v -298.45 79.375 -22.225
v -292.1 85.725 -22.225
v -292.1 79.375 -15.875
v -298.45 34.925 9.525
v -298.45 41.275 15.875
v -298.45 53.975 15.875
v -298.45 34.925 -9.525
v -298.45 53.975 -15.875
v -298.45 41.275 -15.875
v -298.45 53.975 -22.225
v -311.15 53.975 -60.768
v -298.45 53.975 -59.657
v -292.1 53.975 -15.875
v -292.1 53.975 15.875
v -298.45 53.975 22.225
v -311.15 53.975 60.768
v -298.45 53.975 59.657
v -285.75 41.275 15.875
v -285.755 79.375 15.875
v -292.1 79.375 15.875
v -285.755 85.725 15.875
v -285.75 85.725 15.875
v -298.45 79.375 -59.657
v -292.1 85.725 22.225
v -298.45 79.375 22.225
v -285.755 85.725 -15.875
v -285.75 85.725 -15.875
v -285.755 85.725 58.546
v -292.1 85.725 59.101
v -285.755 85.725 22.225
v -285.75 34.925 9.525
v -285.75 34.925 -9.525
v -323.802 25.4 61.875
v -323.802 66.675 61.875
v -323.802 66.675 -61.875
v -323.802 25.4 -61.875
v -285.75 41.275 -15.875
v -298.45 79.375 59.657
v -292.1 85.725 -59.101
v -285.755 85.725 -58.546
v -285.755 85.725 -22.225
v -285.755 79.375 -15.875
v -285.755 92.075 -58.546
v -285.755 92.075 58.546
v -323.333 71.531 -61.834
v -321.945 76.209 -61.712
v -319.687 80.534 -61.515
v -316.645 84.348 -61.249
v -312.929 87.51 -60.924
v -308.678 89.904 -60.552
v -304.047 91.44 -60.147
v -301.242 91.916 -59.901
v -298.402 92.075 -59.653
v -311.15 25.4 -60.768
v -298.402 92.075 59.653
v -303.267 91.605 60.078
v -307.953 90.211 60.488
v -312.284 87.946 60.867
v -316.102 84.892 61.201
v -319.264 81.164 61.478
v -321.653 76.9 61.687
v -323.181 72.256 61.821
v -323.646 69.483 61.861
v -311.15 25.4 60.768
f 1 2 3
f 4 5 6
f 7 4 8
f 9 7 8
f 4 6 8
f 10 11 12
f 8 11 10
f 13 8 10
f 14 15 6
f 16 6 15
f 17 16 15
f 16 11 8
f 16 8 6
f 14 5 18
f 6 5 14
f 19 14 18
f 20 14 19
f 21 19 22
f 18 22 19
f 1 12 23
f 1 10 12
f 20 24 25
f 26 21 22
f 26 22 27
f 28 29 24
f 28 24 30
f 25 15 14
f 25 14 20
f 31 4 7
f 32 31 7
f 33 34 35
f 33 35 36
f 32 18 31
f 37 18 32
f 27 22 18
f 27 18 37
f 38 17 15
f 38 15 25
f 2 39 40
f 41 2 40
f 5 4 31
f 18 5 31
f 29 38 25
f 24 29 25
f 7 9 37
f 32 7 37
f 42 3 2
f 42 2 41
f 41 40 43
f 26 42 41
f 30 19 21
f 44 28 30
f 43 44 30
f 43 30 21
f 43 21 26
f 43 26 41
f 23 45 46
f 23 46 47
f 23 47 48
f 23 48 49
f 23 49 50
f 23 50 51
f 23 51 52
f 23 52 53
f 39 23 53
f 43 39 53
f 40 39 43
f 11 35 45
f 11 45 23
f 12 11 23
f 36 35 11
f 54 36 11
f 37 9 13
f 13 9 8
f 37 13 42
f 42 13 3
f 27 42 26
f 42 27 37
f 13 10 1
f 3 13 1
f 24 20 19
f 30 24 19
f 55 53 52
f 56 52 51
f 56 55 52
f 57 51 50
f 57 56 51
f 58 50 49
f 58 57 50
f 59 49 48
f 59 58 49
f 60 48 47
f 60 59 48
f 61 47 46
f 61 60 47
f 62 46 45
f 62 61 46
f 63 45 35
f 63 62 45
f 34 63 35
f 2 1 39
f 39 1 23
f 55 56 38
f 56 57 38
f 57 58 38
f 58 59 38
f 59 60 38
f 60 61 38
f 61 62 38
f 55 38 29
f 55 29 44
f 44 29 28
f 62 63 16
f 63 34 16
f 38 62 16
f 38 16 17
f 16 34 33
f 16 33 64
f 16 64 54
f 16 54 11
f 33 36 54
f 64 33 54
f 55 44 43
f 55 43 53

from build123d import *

# Parameters (mm, degrees)
BOSS_EXTRUDE1_START       = -61.874871948
BOSS_EXTRUDE1_DEPTH       = 61.874871948
BOSS_EXTRUDE1_START_2     = 33.418244096
BOSS_EXTRUDE1_2_OUTLINE_W = 41
BOSS_EXTRUDE1_2_OUTLINE_H = 70
BOSS_EXTRUDE1_2_DEPTH     = 4.581755904
SKETCH2_W                 = 31.75
SKETCH2_H                 = 50.8
BOSS_EXTRUDE2_DEPTH       = 12.7
CHAMFER1_SIZE             = 6.35


with BuildPart() as part:
    # Boss-Extrude1: read off the stored shape, not the designer's step
    # Boss-Extrude1 outline → Boss-Extrude1 (new body)
    with BuildSketch(Plane.XY.offset(BOSS_EXTRUDE1_START)):
        with BuildLine():
            Line((-285.755139406, 85.725), (-285.755139406, 92.075))
            Line((-285.755139406, 92.075), (-298.401672666, 92.075))
            ThreePointArc((-298.401672666, 92.075), (-316.362184908, 84.635512242), (-323.801672666, 66.675))
            Line((-323.801672666, 66.675), (-323.801672666, 25.4))
            Line((-323.801672666, 25.4), (-311.15, 25.4))
            Line((-311.15, 25.4), (-311.15, 53.975))
            Line((-311.15, 53.975), (-298.45, 53.975))
            Line((-298.45, 53.975), (-298.45, 85.725))
            Line((-298.45, 85.725), (-285.755139406, 85.725))
        make_face()
    boss_extrude1 = extrude(amount=BOSS_EXTRUDE1_DEPTH)

    # Boss-Extrude1 2 outline → Boss-Extrude1 2 (cut)
    with BuildSketch(Plane(origin=(0, 0, 0), x_dir=(0.9961946980917459, 0, 0.08715574274765299), z_dir=(0.087155742747653, 0, -0.996194698091746)).offset(BOSS_EXTRUDE1_START_2)):
        with Locations((-308.5, -59)):
            Rectangle(BOSS_EXTRUDE1_2_OUTLINE_W, BOSS_EXTRUDE1_2_OUTLINE_H)
    boss_extrude1_2 = extrude(amount=BOSS_EXTRUDE1_2_DEPTH, mode=Mode.SUBTRACT)

    # Mirror1: Boss-Extrude1, Boss-Extrude1 2 across plane
    add(boss_extrude1.mirror(Plane.XY))
    add(boss_extrude1_2.mirror(Plane.XY), mode=Mode.SUBTRACT)

    # Sketch2 → Boss-Extrude2 (add)
    with BuildSketch(Plane(origin=(-298.45, 0, 0), x_dir=(0, 0, -1), z_dir=(1, 0, 0))):
        with Locations((0, 60.325)):
            Rectangle(SKETCH2_W, SKETCH2_H)
    extrude(amount=BOSS_EXTRUDE2_DEPTH)

    # Chamfer1
    chamfer1_edges = [part.edges().sort_by_distance(p)[0] for p in [
        (-292.1, 34.925, -15.875),
        (-292.1, 34.925, 15.875),
        (-292.102569703, 85.725, -15.875),
        (-298.45, 85.725, -37.765943994),
        (-298.45, 69.85, -15.875),
        (-298.45, 85.725, 37.765943994),
        (-292.102569703, 85.725, 15.875),
        (-298.45, 69.85, 15.875),
    ]]
    chamfer(chamfer1_edges, length=CHAMFER1_SIZE)


solid = part.part
